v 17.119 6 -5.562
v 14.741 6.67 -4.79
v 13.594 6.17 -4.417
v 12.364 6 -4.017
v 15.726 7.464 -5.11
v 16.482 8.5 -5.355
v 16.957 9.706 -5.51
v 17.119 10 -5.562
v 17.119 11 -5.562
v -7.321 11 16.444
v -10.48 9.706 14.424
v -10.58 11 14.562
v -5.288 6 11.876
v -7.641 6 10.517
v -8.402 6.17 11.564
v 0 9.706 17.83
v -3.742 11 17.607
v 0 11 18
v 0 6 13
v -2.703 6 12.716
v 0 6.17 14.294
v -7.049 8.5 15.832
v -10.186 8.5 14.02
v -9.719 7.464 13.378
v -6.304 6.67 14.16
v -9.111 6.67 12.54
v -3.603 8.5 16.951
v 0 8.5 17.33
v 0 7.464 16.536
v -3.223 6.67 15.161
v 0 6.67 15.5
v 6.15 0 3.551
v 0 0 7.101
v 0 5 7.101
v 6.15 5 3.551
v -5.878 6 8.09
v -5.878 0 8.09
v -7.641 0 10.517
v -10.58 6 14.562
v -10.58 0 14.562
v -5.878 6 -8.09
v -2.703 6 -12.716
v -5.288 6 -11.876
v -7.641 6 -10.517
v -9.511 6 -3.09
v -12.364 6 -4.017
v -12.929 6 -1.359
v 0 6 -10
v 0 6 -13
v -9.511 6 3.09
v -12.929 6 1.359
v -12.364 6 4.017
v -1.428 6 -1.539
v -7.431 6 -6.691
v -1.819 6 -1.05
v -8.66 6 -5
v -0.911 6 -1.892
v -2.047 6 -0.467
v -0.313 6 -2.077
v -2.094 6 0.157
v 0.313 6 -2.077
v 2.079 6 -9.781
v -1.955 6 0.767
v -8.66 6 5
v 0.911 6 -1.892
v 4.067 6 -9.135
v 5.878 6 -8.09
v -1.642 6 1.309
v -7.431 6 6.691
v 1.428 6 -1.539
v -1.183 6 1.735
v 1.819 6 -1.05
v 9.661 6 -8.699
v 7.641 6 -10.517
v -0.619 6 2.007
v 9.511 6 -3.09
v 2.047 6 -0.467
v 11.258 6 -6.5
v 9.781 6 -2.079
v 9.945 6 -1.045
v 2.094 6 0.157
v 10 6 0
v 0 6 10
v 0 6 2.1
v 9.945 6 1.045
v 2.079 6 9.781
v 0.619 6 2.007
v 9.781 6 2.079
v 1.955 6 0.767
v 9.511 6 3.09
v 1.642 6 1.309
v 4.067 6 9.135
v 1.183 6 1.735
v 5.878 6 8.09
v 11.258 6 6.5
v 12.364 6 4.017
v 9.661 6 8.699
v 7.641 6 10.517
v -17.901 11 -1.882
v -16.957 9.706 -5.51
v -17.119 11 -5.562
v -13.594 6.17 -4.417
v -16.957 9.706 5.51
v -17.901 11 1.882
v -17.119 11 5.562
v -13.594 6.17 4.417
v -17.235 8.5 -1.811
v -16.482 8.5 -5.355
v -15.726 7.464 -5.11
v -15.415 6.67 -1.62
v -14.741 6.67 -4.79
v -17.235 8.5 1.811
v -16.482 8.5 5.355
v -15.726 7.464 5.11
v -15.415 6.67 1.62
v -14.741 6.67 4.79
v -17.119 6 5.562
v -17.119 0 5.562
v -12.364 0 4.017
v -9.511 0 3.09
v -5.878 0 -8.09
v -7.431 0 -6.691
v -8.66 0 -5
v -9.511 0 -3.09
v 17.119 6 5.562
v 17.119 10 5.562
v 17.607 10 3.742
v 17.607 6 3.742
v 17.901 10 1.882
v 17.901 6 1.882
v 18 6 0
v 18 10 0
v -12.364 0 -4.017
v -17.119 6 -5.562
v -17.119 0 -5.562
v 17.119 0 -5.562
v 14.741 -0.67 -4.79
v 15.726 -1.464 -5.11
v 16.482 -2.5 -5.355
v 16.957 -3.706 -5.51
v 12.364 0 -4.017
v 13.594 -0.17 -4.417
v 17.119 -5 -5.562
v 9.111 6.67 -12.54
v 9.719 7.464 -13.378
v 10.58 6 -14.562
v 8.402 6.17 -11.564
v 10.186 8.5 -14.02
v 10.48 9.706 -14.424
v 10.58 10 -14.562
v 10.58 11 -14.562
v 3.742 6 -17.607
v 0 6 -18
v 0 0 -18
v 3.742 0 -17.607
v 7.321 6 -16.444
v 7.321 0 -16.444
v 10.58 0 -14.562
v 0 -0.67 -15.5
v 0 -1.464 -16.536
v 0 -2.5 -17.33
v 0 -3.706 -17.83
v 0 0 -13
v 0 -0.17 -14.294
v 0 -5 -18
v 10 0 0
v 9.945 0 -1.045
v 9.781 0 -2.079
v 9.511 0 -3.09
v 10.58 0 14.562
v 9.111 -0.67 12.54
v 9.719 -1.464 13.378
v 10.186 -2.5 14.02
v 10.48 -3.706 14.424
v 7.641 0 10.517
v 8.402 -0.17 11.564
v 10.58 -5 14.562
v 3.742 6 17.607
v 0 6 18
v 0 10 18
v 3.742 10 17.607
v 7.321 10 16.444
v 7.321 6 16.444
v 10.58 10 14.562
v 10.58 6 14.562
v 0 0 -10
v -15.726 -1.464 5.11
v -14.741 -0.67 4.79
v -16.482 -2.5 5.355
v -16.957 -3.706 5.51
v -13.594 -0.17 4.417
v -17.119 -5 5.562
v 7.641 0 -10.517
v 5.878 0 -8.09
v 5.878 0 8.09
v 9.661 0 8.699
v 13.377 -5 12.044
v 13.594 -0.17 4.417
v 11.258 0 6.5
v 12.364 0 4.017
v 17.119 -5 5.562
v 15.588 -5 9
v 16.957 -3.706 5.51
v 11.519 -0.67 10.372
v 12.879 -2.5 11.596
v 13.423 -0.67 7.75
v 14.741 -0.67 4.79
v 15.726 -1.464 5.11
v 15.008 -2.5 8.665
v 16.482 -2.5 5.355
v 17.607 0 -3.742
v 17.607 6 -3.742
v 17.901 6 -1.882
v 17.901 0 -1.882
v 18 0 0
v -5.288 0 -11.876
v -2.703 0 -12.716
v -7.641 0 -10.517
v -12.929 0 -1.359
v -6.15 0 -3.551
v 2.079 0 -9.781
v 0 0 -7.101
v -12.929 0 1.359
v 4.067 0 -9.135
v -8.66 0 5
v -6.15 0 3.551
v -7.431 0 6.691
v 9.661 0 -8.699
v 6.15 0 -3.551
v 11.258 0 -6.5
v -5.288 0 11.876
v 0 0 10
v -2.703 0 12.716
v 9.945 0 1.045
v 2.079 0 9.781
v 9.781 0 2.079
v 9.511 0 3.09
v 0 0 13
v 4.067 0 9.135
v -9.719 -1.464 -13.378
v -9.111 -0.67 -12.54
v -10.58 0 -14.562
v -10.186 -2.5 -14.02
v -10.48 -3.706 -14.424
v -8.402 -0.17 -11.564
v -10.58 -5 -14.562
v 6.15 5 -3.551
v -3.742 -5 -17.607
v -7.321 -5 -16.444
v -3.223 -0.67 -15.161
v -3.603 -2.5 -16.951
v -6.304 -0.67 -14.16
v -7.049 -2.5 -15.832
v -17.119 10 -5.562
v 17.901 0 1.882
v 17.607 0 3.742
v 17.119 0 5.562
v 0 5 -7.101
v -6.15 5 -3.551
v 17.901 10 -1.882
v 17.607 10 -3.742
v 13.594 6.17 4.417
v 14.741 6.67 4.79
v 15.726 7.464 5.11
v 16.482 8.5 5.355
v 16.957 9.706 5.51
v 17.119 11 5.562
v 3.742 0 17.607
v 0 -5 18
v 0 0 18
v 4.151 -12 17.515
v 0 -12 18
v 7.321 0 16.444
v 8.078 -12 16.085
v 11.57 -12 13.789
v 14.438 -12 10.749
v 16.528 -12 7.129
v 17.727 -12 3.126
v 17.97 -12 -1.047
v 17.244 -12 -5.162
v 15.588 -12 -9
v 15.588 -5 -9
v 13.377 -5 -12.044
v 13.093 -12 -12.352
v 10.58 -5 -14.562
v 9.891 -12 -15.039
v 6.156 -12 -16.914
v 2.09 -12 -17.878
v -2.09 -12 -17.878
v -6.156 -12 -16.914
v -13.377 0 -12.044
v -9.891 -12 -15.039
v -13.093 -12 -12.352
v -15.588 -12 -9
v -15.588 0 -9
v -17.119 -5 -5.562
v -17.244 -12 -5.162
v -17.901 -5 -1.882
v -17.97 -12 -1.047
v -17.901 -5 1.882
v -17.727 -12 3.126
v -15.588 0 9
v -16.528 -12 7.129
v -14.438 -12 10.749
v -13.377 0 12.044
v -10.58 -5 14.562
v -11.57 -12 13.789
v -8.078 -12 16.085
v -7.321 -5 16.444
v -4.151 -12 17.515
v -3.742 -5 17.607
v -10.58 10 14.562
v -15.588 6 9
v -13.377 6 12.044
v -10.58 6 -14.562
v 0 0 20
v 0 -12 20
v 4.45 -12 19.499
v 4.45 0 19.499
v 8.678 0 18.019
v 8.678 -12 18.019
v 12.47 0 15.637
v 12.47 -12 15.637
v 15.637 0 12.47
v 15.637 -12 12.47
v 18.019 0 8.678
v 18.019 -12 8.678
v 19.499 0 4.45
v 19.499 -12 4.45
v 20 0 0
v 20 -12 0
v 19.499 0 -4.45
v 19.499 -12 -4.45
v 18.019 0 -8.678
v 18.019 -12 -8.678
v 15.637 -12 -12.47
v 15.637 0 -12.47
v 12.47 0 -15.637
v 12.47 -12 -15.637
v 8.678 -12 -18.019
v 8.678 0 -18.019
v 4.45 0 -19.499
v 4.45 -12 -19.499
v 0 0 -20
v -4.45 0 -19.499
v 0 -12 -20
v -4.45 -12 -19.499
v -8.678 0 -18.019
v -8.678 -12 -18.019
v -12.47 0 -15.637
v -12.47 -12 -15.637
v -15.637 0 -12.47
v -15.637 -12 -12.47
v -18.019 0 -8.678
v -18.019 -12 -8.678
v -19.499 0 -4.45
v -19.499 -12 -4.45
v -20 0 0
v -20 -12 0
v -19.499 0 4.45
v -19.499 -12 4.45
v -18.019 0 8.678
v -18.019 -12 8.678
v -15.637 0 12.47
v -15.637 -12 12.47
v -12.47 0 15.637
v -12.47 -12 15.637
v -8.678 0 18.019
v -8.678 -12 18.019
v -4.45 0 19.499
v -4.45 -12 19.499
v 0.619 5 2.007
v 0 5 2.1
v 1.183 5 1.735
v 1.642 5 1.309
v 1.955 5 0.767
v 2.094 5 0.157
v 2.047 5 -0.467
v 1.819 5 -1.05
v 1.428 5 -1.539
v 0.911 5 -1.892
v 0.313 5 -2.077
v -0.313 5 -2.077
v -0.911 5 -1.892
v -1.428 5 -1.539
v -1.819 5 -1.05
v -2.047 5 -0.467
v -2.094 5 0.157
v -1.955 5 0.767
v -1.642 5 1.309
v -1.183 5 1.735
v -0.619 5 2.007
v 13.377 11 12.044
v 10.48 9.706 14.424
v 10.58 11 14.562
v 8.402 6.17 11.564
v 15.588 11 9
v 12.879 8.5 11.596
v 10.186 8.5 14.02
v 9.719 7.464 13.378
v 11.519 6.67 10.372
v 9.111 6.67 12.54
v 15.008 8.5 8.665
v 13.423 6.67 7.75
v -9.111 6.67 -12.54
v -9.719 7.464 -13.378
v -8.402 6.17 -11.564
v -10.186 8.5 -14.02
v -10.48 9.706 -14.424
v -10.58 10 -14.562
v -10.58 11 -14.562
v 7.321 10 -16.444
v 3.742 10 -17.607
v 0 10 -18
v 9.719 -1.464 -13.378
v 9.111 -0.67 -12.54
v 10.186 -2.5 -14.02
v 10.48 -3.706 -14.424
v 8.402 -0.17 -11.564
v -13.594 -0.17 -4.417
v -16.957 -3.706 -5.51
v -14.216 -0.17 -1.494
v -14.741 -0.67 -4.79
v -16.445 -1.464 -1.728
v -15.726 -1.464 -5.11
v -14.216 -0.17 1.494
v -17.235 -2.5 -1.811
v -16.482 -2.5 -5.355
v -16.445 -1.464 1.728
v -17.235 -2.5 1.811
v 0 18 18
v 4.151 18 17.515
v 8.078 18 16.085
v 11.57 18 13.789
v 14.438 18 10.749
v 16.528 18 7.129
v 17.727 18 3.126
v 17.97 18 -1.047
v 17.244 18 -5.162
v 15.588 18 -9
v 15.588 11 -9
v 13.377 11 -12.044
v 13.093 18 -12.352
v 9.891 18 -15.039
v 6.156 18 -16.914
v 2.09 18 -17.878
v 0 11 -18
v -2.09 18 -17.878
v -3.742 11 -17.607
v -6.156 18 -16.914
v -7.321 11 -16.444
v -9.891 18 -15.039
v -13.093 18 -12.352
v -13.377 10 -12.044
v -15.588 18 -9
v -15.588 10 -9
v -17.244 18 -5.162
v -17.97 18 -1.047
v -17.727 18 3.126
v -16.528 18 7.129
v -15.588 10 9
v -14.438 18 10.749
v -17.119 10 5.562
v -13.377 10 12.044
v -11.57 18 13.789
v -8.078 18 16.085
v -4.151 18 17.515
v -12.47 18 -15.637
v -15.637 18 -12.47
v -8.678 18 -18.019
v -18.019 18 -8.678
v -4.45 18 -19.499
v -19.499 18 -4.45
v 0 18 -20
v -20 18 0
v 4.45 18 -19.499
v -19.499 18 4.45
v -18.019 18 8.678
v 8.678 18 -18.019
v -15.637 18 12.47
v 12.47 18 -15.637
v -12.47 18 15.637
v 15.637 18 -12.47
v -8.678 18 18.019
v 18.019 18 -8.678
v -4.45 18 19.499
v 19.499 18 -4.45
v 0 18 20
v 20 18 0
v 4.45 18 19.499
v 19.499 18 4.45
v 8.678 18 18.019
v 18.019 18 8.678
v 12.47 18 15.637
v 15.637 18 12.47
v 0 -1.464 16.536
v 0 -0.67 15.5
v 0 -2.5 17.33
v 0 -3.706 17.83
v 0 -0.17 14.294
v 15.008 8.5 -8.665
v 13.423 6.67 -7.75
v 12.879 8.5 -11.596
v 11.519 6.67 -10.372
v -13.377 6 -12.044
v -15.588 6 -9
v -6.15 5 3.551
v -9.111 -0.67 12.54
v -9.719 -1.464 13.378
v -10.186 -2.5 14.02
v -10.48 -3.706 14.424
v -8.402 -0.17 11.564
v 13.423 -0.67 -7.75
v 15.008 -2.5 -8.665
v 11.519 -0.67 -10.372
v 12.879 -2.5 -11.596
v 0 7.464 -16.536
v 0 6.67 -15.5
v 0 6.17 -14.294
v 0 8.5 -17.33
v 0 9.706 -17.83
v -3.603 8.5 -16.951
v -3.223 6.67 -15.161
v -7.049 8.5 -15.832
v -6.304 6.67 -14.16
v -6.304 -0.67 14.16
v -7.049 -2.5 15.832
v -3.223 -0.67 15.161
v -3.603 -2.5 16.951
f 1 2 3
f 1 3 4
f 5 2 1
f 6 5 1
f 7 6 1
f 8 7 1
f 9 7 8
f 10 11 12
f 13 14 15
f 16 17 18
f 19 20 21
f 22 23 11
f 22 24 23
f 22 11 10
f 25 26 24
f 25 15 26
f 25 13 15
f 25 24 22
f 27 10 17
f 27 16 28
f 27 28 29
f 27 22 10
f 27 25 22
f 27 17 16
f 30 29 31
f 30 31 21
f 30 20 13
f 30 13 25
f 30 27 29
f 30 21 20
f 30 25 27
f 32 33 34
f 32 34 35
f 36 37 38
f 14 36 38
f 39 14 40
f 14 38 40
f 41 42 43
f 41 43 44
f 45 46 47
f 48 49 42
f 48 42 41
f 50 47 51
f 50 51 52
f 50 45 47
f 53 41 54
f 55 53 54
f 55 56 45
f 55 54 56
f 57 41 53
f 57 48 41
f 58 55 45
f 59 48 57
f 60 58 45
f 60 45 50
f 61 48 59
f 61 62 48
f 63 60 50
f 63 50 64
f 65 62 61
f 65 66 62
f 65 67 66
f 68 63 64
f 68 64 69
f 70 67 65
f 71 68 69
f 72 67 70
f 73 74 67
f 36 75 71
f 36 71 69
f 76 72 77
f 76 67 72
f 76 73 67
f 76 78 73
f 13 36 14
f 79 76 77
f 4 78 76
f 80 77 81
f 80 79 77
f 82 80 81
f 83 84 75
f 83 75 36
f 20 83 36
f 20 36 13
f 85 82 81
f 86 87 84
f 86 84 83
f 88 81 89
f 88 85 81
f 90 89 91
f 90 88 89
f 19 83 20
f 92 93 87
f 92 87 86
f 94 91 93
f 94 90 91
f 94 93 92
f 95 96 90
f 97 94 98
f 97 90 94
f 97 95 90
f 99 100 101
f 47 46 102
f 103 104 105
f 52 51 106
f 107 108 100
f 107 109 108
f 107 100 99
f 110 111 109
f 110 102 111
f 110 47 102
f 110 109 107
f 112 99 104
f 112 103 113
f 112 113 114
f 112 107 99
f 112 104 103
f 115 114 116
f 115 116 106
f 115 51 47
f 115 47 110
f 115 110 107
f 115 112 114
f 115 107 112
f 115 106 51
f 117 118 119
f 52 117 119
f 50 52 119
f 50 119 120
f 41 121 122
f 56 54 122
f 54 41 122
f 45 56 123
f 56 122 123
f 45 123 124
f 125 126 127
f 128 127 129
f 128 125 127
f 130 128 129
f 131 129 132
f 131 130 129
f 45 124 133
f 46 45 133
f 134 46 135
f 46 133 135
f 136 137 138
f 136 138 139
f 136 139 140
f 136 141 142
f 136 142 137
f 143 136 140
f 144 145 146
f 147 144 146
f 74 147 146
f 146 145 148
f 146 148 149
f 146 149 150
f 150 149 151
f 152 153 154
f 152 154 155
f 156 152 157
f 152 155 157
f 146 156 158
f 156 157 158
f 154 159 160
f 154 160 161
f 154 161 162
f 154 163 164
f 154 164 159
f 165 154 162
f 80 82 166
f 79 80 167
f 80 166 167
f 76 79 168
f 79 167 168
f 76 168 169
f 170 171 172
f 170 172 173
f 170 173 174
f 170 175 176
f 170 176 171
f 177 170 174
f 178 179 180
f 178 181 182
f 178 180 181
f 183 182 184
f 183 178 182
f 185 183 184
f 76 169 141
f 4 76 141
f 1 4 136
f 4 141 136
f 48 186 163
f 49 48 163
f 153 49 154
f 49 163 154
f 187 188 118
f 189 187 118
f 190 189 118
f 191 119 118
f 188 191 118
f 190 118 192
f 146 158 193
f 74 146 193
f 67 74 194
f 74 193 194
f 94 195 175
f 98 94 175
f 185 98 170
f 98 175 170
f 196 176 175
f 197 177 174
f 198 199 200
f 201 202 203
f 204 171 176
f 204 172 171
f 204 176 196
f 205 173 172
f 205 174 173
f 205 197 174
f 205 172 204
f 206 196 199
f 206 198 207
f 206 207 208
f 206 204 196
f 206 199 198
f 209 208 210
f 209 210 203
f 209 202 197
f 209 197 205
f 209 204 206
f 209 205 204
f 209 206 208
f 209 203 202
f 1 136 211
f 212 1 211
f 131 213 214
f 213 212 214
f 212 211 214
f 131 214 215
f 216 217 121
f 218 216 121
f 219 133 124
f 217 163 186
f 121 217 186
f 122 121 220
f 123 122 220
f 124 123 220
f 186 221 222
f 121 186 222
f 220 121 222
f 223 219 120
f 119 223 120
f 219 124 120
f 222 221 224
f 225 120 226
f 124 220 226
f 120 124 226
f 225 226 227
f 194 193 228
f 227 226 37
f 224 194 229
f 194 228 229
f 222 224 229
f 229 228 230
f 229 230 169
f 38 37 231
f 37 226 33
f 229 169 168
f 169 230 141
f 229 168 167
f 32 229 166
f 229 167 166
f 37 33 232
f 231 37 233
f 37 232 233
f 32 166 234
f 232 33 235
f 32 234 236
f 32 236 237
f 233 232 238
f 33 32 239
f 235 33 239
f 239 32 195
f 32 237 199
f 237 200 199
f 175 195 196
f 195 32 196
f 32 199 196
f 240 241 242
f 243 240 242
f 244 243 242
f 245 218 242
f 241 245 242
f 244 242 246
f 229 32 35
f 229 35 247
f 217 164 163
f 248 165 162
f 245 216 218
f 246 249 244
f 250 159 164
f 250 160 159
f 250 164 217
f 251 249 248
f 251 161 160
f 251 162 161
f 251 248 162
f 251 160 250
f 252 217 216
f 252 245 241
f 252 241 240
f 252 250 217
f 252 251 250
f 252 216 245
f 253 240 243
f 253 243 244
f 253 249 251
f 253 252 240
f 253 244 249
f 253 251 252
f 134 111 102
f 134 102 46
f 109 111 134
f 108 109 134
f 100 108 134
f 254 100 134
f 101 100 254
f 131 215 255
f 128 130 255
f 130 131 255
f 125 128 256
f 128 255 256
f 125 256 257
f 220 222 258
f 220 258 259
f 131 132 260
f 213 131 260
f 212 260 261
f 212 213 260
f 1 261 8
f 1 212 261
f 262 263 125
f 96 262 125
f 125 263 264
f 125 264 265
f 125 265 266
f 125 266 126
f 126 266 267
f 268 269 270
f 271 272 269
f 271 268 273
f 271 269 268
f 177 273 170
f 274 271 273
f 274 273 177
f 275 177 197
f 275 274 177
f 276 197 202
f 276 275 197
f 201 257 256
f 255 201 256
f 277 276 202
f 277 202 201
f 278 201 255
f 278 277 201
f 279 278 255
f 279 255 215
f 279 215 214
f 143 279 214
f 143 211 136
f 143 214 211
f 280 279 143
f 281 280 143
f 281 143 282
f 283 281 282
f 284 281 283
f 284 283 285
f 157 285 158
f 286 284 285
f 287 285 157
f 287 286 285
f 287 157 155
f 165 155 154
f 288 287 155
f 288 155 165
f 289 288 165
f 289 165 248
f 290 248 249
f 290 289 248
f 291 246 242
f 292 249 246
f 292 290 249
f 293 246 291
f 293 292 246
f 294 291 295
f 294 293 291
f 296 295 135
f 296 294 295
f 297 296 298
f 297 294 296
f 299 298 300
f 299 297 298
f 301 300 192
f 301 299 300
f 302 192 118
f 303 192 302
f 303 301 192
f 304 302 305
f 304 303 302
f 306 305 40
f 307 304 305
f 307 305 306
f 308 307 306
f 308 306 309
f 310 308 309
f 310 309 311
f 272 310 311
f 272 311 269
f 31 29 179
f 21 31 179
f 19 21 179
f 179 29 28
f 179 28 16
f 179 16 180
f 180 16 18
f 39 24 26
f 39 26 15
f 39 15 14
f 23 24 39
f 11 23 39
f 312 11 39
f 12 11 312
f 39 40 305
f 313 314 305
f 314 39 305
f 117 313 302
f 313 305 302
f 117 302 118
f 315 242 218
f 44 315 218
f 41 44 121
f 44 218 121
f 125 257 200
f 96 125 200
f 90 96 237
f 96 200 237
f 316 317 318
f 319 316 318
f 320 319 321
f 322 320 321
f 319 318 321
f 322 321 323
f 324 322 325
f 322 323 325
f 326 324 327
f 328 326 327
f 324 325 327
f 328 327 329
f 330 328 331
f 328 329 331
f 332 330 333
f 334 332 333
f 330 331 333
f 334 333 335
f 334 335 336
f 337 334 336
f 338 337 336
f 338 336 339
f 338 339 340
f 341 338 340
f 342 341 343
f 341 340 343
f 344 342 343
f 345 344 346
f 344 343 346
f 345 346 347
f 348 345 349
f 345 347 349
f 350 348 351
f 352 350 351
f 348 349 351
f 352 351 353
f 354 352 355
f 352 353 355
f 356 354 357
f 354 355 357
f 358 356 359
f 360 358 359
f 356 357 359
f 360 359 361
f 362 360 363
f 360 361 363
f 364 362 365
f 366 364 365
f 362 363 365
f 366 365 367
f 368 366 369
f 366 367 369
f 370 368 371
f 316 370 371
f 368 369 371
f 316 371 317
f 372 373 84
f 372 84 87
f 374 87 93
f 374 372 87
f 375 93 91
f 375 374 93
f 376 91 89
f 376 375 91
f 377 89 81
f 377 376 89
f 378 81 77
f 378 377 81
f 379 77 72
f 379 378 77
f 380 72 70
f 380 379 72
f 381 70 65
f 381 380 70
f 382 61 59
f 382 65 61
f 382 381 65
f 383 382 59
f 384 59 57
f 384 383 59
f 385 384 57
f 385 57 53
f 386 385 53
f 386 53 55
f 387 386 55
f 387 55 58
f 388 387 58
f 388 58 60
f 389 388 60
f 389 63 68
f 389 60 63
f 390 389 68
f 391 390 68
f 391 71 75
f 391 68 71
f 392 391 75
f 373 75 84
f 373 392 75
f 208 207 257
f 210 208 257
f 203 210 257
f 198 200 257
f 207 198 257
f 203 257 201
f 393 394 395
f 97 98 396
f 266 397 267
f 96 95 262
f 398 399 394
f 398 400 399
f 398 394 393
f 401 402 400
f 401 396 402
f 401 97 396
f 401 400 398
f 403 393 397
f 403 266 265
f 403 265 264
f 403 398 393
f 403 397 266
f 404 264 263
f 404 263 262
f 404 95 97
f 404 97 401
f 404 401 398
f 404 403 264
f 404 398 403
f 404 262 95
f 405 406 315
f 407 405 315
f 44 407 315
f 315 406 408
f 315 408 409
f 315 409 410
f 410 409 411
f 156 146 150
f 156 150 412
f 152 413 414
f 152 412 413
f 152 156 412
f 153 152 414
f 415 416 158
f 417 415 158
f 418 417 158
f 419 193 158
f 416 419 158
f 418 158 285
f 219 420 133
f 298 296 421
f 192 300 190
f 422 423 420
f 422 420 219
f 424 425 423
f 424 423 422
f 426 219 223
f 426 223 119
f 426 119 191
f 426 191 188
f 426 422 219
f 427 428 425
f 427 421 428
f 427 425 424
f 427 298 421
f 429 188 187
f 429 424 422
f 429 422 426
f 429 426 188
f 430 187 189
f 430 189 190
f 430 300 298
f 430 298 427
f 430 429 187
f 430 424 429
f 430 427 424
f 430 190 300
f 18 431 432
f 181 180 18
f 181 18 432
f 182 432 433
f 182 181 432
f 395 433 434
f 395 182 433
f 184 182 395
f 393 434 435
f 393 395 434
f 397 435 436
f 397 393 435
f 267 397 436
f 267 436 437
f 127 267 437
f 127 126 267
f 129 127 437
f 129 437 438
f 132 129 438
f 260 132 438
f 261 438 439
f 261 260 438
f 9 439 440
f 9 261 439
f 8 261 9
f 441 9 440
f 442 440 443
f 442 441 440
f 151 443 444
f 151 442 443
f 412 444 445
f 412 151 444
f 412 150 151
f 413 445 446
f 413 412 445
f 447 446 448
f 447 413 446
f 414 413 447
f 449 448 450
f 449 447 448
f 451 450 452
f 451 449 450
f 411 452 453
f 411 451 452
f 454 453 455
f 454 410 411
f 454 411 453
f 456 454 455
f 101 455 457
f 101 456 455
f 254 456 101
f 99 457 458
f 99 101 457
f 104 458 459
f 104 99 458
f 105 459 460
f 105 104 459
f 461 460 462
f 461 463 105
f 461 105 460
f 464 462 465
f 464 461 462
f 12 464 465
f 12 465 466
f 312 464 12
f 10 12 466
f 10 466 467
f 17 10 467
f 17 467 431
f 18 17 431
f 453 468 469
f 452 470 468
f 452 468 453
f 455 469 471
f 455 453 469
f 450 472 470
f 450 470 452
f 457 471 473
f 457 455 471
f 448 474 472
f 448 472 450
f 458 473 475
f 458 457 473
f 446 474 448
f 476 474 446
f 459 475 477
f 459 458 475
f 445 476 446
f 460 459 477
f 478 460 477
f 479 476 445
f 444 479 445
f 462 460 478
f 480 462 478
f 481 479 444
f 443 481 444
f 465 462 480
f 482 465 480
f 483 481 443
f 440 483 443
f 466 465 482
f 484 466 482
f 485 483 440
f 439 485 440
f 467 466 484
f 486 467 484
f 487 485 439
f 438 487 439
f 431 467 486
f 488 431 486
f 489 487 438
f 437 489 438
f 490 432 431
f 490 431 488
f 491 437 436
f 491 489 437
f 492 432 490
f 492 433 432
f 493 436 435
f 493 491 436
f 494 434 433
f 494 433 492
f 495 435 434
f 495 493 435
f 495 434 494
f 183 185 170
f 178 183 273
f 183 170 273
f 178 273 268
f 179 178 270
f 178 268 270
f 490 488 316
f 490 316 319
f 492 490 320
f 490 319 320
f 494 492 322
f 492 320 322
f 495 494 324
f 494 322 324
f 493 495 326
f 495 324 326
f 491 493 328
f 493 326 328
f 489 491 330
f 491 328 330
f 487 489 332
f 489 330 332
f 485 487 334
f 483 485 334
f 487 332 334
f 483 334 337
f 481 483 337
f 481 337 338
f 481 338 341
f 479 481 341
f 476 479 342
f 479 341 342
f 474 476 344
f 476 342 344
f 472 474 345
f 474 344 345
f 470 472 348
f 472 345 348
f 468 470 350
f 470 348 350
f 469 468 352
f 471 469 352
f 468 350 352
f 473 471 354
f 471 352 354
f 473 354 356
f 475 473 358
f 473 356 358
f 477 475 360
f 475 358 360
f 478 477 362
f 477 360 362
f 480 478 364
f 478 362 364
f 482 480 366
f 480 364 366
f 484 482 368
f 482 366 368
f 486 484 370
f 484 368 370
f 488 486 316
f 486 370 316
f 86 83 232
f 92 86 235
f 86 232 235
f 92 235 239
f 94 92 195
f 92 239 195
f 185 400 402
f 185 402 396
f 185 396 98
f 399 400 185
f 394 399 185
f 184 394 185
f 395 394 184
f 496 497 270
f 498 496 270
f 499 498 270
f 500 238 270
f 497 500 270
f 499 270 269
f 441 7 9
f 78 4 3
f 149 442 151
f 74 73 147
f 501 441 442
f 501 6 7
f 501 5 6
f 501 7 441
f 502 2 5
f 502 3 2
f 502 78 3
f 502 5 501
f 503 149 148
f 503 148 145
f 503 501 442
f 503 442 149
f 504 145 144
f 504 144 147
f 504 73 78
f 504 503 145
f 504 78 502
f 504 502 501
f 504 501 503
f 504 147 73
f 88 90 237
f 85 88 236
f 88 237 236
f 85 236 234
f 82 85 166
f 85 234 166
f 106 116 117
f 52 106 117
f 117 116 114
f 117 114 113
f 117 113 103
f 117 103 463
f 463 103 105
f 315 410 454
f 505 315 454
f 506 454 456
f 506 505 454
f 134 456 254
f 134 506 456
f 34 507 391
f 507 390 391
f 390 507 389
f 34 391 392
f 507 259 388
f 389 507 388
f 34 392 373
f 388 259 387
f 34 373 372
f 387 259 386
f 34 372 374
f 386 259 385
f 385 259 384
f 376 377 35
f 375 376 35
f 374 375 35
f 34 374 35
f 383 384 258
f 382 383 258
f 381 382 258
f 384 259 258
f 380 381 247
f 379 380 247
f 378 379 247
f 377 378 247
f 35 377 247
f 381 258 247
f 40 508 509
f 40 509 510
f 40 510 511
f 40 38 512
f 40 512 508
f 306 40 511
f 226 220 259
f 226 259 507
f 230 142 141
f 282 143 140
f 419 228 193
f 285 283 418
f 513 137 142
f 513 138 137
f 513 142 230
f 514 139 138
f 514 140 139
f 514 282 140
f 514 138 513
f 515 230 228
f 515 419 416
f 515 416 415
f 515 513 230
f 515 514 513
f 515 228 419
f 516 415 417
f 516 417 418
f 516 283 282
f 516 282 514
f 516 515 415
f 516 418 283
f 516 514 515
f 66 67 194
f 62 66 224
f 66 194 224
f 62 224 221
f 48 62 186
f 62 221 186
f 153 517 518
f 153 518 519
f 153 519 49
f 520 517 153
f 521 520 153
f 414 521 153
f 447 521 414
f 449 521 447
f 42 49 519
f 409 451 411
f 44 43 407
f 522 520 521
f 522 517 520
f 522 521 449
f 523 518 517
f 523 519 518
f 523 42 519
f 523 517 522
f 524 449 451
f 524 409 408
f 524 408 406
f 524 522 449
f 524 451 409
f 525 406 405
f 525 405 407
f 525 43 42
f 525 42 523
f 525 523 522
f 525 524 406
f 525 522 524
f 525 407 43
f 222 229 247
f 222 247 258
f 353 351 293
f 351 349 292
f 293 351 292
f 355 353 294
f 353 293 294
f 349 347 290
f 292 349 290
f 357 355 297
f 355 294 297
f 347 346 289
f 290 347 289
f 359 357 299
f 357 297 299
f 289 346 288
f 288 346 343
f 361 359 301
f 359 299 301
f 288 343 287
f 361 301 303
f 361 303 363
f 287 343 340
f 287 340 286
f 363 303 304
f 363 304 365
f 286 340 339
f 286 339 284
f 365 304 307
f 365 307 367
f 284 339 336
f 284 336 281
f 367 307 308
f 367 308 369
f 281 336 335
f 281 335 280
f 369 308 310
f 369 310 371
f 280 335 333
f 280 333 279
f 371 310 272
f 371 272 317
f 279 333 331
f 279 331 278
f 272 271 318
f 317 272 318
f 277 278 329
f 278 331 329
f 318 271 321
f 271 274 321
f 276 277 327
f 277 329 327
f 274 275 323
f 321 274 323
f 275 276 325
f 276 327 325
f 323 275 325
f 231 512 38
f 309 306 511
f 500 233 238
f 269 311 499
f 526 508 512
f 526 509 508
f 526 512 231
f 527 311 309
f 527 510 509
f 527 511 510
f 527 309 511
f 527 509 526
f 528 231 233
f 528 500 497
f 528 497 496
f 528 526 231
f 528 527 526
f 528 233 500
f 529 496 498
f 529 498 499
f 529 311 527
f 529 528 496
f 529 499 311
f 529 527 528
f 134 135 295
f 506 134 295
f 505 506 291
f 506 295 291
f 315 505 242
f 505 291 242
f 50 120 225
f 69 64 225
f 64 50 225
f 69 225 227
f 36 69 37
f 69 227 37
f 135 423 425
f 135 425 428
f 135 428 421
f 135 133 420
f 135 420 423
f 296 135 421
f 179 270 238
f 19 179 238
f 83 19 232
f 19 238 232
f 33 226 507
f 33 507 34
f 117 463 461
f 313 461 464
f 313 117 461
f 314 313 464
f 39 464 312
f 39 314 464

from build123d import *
from build123d.topology import SkipClean

# Parameters (mm, degrees)
SKETCH1_R           = 18
BOSS_EXTRUDE1_DEPTH = 6
CUT_EXTRUDE1_DEPTH  = 5
SKETCH1_28_R        = 2.1
CUT_EXTRUDE2_DEPTH  = 27.153393661
SKETCH1_29_R        = 20
SKETCH1_29_R_2      = 18
BOSS_EXTRUDE2_DEPTH = 18
CUT_EXTRUDE3_DEPTH  = 10
BOSS_EXTRUDE3_START = -12
SKETCH1_30_R        = 20
SKETCH1_30_R_2      = 18
BOSS_EXTRUDE3_DEPTH = 12
FILLET1_ANGLE       = 36
FILLET1_2_ANGLE     = 36
FILLET1_3_ANGLE     = 36
FILLET1_4_ANGLE     = 36
FILLET1_5_ANGLE     = 36


with BuildPart() as part:
    # Sketch1 → Boss-Extrude1 (new body)
    with BuildSketch(Plane(origin=(0, 0, 0), x_dir=(1, 0, 0), z_dir=(0, 1, 0))):
        with Locations(Location((0, 0, 0), (0, 0, 270))):
            Circle(SKETCH1_R)
    extrude(amount=BOSS_EXTRUDE1_DEPTH)

    # Sketch1<27> → Cut-Extrude1 (cut)
    with BuildSketch(Plane(origin=(0, 0, 0), x_dir=(1, 0, 0), z_dir=(0, 1, 0))):
        Polygon((0, -7.101408311), (6.15, -3.550704156), (6.15, 3.550704156), (0, 7.101408311), (-6.15, 3.550704156), (-6.15, -3.550704156), align=None)
    extrude(amount=CUT_EXTRUDE1_DEPTH, mode=Mode.SUBTRACT)

    # Sketch1<28> → Cut-Extrude2 (cut, through all)
    with BuildSketch(Plane(origin=(0, 0, 0), x_dir=(1, 0, 0), z_dir=(0, 1, 0))):
        with Locations(Location((0, 0, 0), (0, 0, 270))):
            Circle(SKETCH1_28_R)
    extrude(amount=CUT_EXTRUDE2_DEPTH, mode=Mode.SUBTRACT)

    # Sketch1<29> → Boss-Extrude2 (add)
    with BuildSketch(Plane(origin=(0, 0, 0), x_dir=(1, 0, 0), z_dir=(0, 1, 0))):
        with Locations(Location((0, 0, 0), (0, 0, 270))):
            Circle(SKETCH1_29_R)
        with Locations(Location((0, 0, 0), (0, 0, 270))):
            Circle(SKETCH1_29_R_2, mode=Mode.SUBTRACT)
    extrude(amount=BOSS_EXTRUDE2_DEPTH)

    # Sketch2 → Cut-Extrude3 (cut)
    with SkipClean():  # the faces are left unmerged after this step: merging them gives an invalid solid
        with BuildSketch(Plane.XZ):
            with BuildLine():
                ThreePointArc((5.877852523, -8.090169944), (3.090169944, -9.510565163), (0, -10))
                Line((0, -10), (0, -18))
                ThreePointArc((0, -18), (5.562305899, -17.119017293), (10.580134541, -14.562305899))
                Line((10.580134541, -14.562305899), (5.877852523, -8.090169944))
            make_face()
            with BuildLine():
                Line((-10.580134541, -14.562305899), (-5.877852523, -8.090169944))
                ThreePointArc((-5.877852523, -8.090169944), (-8.090169944, -5.877852523), (-9.510565163, -3.090169944))
                Line((-9.510565163, -3.090169944), (-17.119017293, -5.562305899))
                ThreePointArc((-17.119017293, -5.562305899), (-14.562305899, -10.580134541), (-10.580134541, -14.562305899))
            make_face()
            with BuildLine():
                Line((-17.119017293, 5.562305899), (-9.510565163, 3.090169944))
                ThreePointArc((-9.510565163, 3.090169944), (-8.090169944, 5.877852523), (-5.877852523, 8.090169944))
                Line((-5.877852523, 8.090169944), (-10.580134541, 14.562305899))
                ThreePointArc((-10.580134541, 14.562305899), (-14.562305899, 10.580134541), (-17.119017293, 5.562305899))
            make_face()
            with BuildLine():
                Line((0, 18), (0, 10))
                ThreePointArc((0, 10), (3.090169944, 9.510565163), (5.877852523, 8.090169944))
                Line((5.877852523, 8.090169944), (10.580134541, 14.562305899))
                ThreePointArc((10.580134541, 14.562305899), (5.562305899, 17.119017293), (0, 18))
            make_face()
            with BuildLine():
                ThreePointArc((10, 0), (9.876883406, -1.56434465), (9.510565163, -3.090169944))
                Line((9.510565163, -3.090169944), (17.119017293, -5.562305899))
                ThreePointArc((17.119017293, -5.562305899), (17.778390131, -2.815820371), (18, 0))
                ThreePointArc((18, 0), (17.778390131, 2.815820371), (17.119017293, 5.562305899))
                Line((17.119017293, 5.562305899), (9.510565163, 3.090169944))
                ThreePointArc((9.510565163, 3.090169944), (9.876883406, 1.56434465), (10, 0))
            make_face()
        extrude(amount=-CUT_EXTRUDE3_DEPTH, mode=Mode.SUBTRACT)
    add(part.part.scale(1), mode=Mode.REPLACE)  # the faces are merged on a copy

    # Sketch1<30> → Boss-Extrude3 (add)
    with SkipClean():  # the faces are left unmerged after this step: merging them gives an invalid solid
        with BuildSketch(Plane(origin=(0, 0, 0), x_dir=(1, 0, 0), z_dir=(0, 1, 0)).offset(BOSS_EXTRUDE3_START)):
            with Locations(Location((0, 0, 0), (0, 0, 270))):
                Circle(SKETCH1_30_R)
            with Locations(Location((0, 0, 0), (0, 0, 270))):
                Circle(SKETCH1_30_R_2, mode=Mode.SUBTRACT)
        extrude(amount=BOSS_EXTRUDE3_DEPTH)

    # Fillet1: read off the stored shape, not the designer's step
    # Fillet1 outline → Fillet1 (revolve)
    with SkipClean():  # the faces are left unmerged after this step: merging them gives an invalid solid
        with BuildSketch(Plane(origin=(0, 0, 0), x_dir=(-0.9510565162951906, 0, -0.3090169943748335), z_dir=(0.3090169943748335, 0, -0.9510565162951906))):
            with BuildLine():
                ThreePointArc((18, 11), (16.535533906, 7.464466094), (13, 6))
                Line((13, 6), (18, 6))
                Line((18, 6), (18, 11))
            make_face()
            with BuildLine():
                Line((18, 0), (13, 0))
                ThreePointArc((13, 0), (16.535533906, -1.464466094), (18, -5))
                Line((18, -5), (18, 0))
            make_face()
        revolve(axis=Axis((0, 0, 0), (0, 1, 0)), revolution_arc=FILLET1_ANGLE)

    # Fillet1 2 outline → Fillet1 2 (revolve)
    with SkipClean():  # the faces are left unmerged after this step: merging them gives an invalid solid
        with BuildSketch(Plane(origin=(0, 0, 0), x_dir=(-0.5877852522922776, 0, 0.8090169943750894), z_dir=(-0.8090169943750894, 0, -0.5877852522922776))):
            with BuildLine():
                ThreePointArc((18, 11), (16.535533906, 7.464466094), (13, 6))
                Line((13, 6), (18, 6))
                Line((18, 6), (18, 11))
            make_face()
            with BuildLine():
                Line((18, 0), (13, 0))
                ThreePointArc((13, 0), (16.535533906, -1.464466094), (18, -5))
                Line((18, -5), (18, 0))
            make_face()
        revolve(axis=Axis((0, 0, 0), (0, 1, 0)), revolution_arc=FILLET1_2_ANGLE)

    # Fillet1 3 outline → Fillet1 3 (revolve)
    with SkipClean():  # the faces are left unmerged after this step: merging them gives an invalid solid
        with BuildSketch(Plane(origin=(0, 0, 0), x_dir=(0.5877852522925205, 0, 0.809016994374913), z_dir=(-0.809016994374913, 0, 0.5877852522925205))):
            with BuildLine():
                ThreePointArc((18, 11), (16.535533906, 7.464466094), (13, 6))
                Line((13, 6), (18, 6))
                Line((18, 6), (18, 11))
            make_face()
            with BuildLine():
                Line((18, 0), (13, 0))
                ThreePointArc((13, 0), (16.535533906, -1.464466094), (18, -5))
                Line((18, -5), (18, 0))
            make_face()
        revolve(axis=Axis((0, 0, 0), (0, 1, 0)), revolution_arc=FILLET1_3_ANGLE)

    # Fillet1 4 outline → Fillet1 4 (revolve)
    with SkipClean():  # the faces are left unmerged after this step: merging them gives an invalid solid
        with BuildSketch(Plane(origin=(0, 0, 0), x_dir=(0, 0, -1), z_dir=(1, 0, 0))):
            with BuildLine():
                ThreePointArc((18, 11), (16.535533906, 7.464466094), (13, 6))
                Line((13, 6), (18, 6))
                Line((18, 6), (18, 11))
            make_face()
            with BuildLine():
                Line((18, 0), (13, 0))
                ThreePointArc((13, 0), (16.535533906, -1.464466094), (18, -5))
                Line((18, -5), (18, 0))
            make_face()
        revolve(axis=Axis((0, 0, 0), (0, 1, 0)), revolution_arc=FILLET1_4_ANGLE)

    # Fillet1 5 outline → Fillet1 5 (revolve)
    with SkipClean():  # the faces are left unmerged after this step: merging them gives an invalid solid
        with BuildSketch(Plane(origin=(0, 0, 0), x_dir=(0.9510565162951443, 0, -0.3090169943749758), z_dir=(0.3090169943749758, 0, 0.9510565162951443))):
            with BuildLine():
                ThreePointArc((18, 11), (16.535533906, 7.464466094), (13, 6))
                Line((13, 6), (18, 6))
                Line((18, 6), (18, 11))
            make_face()
            with BuildLine():
                Line((18, 0), (13, 0))
                ThreePointArc((13, 0), (16.535533906, -1.464466094), (18, -5))
                Line((18, -5), (18, 0))
            make_face()
        revolve(axis=Axis((0, 0, 0), (0, 1, 0)), revolution_arc=FILLET1_5_ANGLE)


solid = part.part
